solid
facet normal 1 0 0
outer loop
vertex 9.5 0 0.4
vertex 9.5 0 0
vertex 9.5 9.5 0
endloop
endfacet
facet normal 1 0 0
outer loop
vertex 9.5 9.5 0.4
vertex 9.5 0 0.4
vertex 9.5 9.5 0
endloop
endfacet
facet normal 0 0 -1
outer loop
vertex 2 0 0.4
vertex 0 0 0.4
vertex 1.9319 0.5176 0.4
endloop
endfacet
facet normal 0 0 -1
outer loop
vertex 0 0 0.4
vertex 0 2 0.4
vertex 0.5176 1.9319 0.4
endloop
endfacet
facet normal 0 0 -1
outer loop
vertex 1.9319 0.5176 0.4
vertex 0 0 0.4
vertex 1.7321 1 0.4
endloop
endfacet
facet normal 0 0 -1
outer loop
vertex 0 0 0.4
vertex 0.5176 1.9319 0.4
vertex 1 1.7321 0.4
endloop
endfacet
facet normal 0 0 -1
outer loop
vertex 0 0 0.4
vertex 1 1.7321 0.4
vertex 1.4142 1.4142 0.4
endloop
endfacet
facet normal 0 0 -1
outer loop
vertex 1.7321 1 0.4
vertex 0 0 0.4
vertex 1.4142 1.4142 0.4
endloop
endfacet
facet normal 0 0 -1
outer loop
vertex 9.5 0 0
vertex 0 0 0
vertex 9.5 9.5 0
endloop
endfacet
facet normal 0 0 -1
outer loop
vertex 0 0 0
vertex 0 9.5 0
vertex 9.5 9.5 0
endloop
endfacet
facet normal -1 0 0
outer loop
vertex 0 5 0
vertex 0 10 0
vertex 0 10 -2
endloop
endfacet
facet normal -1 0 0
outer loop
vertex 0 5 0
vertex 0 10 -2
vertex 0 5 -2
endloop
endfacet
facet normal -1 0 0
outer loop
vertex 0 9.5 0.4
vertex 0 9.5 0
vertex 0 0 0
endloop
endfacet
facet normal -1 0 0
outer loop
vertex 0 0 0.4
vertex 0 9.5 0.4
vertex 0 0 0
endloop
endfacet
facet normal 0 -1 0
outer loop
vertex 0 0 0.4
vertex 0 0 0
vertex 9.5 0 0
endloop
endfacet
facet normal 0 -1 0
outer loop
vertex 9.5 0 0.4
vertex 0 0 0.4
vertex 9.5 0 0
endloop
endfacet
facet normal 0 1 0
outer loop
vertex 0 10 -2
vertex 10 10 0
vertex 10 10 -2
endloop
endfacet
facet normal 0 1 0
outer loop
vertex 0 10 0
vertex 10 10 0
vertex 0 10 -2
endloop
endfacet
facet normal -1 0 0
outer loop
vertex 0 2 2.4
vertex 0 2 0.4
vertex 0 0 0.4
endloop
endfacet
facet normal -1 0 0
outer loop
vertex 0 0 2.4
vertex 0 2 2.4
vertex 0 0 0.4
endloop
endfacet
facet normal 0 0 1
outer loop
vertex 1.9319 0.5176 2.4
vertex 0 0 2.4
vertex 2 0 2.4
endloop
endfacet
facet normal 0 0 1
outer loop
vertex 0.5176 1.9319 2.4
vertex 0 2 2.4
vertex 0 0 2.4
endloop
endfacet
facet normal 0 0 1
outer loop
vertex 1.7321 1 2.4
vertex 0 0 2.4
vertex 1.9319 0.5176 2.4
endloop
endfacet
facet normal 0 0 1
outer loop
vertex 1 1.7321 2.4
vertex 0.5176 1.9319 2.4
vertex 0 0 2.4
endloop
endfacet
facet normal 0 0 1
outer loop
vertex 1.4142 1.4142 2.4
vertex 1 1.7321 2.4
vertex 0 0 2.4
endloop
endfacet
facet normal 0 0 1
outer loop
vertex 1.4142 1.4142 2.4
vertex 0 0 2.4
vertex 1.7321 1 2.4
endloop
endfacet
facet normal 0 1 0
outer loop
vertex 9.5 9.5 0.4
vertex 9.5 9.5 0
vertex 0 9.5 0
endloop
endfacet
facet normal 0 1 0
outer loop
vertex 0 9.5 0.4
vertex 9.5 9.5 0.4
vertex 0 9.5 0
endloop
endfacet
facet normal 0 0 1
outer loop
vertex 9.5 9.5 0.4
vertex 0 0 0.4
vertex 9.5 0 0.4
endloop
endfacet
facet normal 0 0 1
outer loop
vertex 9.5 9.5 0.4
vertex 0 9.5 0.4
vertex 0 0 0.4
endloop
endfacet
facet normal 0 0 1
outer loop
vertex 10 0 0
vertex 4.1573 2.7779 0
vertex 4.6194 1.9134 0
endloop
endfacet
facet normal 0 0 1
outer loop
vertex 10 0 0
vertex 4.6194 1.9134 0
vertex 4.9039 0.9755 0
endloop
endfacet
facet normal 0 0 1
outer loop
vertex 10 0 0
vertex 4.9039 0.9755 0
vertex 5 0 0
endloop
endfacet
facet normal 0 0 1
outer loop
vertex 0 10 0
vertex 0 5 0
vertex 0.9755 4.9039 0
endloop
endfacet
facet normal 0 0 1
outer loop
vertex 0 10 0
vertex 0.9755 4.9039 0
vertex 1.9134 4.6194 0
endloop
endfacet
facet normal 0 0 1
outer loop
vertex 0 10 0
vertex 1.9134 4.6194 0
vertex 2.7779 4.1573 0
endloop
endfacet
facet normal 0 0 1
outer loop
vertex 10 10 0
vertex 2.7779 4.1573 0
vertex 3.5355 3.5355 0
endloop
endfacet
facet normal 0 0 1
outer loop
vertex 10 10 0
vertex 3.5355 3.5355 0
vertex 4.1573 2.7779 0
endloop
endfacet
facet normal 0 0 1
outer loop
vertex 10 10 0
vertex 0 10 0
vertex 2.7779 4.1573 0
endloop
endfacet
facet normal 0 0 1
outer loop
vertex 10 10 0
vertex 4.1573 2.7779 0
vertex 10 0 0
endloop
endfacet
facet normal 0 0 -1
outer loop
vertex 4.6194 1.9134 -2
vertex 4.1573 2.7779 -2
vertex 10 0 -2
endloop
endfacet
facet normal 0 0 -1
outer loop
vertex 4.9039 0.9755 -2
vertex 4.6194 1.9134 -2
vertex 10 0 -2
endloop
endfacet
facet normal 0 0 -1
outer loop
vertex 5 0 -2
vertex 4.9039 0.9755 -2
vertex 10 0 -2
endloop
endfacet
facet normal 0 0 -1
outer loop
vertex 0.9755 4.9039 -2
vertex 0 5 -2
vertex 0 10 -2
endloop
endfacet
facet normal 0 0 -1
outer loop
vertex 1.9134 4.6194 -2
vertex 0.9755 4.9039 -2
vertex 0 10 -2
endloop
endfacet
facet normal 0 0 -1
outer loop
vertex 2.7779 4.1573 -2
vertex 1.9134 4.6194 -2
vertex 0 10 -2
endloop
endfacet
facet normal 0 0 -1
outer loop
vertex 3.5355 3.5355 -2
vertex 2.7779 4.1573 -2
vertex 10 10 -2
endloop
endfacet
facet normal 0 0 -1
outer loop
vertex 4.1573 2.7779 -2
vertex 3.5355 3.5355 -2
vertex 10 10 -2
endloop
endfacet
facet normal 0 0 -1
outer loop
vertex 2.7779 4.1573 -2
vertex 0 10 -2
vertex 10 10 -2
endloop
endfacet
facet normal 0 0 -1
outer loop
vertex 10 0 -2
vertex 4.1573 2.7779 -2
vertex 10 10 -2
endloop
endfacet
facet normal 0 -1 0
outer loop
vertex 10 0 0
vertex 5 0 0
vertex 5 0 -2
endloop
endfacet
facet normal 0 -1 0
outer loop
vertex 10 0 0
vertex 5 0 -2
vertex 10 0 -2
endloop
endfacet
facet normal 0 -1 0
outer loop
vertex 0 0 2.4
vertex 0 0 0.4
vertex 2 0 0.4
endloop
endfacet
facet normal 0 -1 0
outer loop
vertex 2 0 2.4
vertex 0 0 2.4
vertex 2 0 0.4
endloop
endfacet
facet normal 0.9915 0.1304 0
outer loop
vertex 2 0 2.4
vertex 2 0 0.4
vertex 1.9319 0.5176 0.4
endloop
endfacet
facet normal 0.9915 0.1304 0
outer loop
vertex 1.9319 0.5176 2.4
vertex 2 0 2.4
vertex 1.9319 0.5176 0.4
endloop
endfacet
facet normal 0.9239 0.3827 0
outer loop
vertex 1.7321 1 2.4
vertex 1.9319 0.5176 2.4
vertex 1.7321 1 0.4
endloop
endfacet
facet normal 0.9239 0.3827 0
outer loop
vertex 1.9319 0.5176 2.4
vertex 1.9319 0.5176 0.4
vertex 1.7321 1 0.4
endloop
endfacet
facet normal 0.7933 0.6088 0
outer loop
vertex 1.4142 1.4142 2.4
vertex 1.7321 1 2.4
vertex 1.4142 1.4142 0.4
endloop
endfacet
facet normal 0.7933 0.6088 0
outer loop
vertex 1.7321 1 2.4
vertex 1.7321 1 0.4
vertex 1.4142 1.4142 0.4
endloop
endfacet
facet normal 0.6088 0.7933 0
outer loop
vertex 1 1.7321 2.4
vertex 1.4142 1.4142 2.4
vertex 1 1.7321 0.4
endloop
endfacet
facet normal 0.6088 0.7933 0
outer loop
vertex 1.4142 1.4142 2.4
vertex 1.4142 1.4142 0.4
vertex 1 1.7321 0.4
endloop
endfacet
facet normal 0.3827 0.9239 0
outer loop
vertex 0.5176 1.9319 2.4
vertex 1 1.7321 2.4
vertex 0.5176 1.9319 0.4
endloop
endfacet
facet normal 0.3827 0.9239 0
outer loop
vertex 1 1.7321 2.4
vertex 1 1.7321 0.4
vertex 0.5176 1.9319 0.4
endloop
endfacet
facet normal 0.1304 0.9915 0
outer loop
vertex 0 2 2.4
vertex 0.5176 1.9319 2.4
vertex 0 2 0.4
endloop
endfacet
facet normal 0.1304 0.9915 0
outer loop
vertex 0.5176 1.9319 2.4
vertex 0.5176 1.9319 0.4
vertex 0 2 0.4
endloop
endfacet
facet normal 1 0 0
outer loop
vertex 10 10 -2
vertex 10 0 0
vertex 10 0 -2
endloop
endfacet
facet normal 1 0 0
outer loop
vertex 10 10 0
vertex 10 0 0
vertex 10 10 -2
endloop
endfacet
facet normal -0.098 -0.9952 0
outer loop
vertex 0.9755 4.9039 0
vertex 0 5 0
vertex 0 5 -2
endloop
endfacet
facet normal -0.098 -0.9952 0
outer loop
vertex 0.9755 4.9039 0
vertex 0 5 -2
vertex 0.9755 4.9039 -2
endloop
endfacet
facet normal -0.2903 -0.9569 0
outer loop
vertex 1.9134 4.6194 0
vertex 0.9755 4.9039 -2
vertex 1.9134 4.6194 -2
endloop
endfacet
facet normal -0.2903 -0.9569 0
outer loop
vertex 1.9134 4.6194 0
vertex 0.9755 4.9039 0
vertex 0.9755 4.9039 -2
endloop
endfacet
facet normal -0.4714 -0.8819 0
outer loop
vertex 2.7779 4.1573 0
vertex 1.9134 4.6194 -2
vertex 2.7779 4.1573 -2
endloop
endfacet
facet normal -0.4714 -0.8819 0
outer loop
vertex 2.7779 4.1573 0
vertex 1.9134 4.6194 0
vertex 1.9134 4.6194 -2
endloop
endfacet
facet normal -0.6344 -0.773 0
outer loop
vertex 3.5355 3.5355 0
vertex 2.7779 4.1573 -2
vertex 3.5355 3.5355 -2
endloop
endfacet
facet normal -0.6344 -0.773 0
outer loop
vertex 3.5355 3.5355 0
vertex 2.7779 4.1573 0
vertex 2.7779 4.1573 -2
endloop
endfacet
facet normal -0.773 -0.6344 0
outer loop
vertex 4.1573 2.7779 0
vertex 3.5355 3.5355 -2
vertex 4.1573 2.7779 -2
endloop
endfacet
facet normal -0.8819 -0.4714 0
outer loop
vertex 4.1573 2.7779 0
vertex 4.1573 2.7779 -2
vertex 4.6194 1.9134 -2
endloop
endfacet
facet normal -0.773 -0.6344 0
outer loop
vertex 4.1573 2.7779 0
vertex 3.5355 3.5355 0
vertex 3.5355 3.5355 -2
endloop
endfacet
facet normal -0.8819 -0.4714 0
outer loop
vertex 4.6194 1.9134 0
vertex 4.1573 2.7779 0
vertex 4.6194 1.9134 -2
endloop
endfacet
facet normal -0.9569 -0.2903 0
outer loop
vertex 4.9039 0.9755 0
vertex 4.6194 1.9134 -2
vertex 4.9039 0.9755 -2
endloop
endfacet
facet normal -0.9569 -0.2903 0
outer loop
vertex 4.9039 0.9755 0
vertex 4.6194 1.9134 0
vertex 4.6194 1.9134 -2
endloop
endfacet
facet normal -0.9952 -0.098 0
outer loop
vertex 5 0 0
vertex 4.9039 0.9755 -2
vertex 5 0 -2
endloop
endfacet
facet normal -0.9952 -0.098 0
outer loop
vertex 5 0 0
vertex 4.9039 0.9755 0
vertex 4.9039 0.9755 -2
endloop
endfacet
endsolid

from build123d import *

# Parameters (mm, degrees)
F1_DEPTH = 2
F3_DEPTH = 0.4
F5_DEPTH = 2


with BuildPart() as f1:
    # F0 (on Top) → F1 (new body)
    with BuildSketch(Plane.XY):
        with BuildLine():
            ThreePointArc((0, 5), (3.5355339059, 3.5355339059), (5, 0))
            Line((5, 0), (10, 0))
            Line((10, 0), (10, 10))
            Line((10, 10), (0, 10))
            Line((0, 10), (0, 5))
        make_face()
    extrude(amount=-F1_DEPTH)


with BuildPart() as f3:
    # F2 (on face) → F3 (new body)
    with BuildSketch(Plane.XY):
        with BuildLine():
            Line((0, 5), (0, 0))
            Line((0, 0), (5, 0))
            ThreePointArc((5, 0), (3.5355339059, 3.5355339059), (0, 5))
        make_face()
        with BuildLine():
            ThreePointArc((0, 5), (3.5355339059, 3.5355339059), (5, 0))
            Line((5, 0), (9.5, 0))
            Line((9.5, 0), (9.5, 9.5))
            Line((9.5, 9.5), (0, 9.5))
            Line((0, 9.5), (0, 5))
        make_face()
    extrude(amount=F3_DEPTH)


with BuildPart() as f5:
    # F4 (on face) → F5 (new body)
    with BuildSketch(Plane.XY.offset(0.4)):
        with BuildLine():
            Line((0, 0), (2, 0))
            ThreePointArc((2, 0), (1.4142135624, 1.4142135624), (0, 2))
            Line((0, 2), (0, 0))
        make_face()
    extrude(amount=F5_DEPTH)


solid = Compound([f1.part, f3.part, f5.part])
